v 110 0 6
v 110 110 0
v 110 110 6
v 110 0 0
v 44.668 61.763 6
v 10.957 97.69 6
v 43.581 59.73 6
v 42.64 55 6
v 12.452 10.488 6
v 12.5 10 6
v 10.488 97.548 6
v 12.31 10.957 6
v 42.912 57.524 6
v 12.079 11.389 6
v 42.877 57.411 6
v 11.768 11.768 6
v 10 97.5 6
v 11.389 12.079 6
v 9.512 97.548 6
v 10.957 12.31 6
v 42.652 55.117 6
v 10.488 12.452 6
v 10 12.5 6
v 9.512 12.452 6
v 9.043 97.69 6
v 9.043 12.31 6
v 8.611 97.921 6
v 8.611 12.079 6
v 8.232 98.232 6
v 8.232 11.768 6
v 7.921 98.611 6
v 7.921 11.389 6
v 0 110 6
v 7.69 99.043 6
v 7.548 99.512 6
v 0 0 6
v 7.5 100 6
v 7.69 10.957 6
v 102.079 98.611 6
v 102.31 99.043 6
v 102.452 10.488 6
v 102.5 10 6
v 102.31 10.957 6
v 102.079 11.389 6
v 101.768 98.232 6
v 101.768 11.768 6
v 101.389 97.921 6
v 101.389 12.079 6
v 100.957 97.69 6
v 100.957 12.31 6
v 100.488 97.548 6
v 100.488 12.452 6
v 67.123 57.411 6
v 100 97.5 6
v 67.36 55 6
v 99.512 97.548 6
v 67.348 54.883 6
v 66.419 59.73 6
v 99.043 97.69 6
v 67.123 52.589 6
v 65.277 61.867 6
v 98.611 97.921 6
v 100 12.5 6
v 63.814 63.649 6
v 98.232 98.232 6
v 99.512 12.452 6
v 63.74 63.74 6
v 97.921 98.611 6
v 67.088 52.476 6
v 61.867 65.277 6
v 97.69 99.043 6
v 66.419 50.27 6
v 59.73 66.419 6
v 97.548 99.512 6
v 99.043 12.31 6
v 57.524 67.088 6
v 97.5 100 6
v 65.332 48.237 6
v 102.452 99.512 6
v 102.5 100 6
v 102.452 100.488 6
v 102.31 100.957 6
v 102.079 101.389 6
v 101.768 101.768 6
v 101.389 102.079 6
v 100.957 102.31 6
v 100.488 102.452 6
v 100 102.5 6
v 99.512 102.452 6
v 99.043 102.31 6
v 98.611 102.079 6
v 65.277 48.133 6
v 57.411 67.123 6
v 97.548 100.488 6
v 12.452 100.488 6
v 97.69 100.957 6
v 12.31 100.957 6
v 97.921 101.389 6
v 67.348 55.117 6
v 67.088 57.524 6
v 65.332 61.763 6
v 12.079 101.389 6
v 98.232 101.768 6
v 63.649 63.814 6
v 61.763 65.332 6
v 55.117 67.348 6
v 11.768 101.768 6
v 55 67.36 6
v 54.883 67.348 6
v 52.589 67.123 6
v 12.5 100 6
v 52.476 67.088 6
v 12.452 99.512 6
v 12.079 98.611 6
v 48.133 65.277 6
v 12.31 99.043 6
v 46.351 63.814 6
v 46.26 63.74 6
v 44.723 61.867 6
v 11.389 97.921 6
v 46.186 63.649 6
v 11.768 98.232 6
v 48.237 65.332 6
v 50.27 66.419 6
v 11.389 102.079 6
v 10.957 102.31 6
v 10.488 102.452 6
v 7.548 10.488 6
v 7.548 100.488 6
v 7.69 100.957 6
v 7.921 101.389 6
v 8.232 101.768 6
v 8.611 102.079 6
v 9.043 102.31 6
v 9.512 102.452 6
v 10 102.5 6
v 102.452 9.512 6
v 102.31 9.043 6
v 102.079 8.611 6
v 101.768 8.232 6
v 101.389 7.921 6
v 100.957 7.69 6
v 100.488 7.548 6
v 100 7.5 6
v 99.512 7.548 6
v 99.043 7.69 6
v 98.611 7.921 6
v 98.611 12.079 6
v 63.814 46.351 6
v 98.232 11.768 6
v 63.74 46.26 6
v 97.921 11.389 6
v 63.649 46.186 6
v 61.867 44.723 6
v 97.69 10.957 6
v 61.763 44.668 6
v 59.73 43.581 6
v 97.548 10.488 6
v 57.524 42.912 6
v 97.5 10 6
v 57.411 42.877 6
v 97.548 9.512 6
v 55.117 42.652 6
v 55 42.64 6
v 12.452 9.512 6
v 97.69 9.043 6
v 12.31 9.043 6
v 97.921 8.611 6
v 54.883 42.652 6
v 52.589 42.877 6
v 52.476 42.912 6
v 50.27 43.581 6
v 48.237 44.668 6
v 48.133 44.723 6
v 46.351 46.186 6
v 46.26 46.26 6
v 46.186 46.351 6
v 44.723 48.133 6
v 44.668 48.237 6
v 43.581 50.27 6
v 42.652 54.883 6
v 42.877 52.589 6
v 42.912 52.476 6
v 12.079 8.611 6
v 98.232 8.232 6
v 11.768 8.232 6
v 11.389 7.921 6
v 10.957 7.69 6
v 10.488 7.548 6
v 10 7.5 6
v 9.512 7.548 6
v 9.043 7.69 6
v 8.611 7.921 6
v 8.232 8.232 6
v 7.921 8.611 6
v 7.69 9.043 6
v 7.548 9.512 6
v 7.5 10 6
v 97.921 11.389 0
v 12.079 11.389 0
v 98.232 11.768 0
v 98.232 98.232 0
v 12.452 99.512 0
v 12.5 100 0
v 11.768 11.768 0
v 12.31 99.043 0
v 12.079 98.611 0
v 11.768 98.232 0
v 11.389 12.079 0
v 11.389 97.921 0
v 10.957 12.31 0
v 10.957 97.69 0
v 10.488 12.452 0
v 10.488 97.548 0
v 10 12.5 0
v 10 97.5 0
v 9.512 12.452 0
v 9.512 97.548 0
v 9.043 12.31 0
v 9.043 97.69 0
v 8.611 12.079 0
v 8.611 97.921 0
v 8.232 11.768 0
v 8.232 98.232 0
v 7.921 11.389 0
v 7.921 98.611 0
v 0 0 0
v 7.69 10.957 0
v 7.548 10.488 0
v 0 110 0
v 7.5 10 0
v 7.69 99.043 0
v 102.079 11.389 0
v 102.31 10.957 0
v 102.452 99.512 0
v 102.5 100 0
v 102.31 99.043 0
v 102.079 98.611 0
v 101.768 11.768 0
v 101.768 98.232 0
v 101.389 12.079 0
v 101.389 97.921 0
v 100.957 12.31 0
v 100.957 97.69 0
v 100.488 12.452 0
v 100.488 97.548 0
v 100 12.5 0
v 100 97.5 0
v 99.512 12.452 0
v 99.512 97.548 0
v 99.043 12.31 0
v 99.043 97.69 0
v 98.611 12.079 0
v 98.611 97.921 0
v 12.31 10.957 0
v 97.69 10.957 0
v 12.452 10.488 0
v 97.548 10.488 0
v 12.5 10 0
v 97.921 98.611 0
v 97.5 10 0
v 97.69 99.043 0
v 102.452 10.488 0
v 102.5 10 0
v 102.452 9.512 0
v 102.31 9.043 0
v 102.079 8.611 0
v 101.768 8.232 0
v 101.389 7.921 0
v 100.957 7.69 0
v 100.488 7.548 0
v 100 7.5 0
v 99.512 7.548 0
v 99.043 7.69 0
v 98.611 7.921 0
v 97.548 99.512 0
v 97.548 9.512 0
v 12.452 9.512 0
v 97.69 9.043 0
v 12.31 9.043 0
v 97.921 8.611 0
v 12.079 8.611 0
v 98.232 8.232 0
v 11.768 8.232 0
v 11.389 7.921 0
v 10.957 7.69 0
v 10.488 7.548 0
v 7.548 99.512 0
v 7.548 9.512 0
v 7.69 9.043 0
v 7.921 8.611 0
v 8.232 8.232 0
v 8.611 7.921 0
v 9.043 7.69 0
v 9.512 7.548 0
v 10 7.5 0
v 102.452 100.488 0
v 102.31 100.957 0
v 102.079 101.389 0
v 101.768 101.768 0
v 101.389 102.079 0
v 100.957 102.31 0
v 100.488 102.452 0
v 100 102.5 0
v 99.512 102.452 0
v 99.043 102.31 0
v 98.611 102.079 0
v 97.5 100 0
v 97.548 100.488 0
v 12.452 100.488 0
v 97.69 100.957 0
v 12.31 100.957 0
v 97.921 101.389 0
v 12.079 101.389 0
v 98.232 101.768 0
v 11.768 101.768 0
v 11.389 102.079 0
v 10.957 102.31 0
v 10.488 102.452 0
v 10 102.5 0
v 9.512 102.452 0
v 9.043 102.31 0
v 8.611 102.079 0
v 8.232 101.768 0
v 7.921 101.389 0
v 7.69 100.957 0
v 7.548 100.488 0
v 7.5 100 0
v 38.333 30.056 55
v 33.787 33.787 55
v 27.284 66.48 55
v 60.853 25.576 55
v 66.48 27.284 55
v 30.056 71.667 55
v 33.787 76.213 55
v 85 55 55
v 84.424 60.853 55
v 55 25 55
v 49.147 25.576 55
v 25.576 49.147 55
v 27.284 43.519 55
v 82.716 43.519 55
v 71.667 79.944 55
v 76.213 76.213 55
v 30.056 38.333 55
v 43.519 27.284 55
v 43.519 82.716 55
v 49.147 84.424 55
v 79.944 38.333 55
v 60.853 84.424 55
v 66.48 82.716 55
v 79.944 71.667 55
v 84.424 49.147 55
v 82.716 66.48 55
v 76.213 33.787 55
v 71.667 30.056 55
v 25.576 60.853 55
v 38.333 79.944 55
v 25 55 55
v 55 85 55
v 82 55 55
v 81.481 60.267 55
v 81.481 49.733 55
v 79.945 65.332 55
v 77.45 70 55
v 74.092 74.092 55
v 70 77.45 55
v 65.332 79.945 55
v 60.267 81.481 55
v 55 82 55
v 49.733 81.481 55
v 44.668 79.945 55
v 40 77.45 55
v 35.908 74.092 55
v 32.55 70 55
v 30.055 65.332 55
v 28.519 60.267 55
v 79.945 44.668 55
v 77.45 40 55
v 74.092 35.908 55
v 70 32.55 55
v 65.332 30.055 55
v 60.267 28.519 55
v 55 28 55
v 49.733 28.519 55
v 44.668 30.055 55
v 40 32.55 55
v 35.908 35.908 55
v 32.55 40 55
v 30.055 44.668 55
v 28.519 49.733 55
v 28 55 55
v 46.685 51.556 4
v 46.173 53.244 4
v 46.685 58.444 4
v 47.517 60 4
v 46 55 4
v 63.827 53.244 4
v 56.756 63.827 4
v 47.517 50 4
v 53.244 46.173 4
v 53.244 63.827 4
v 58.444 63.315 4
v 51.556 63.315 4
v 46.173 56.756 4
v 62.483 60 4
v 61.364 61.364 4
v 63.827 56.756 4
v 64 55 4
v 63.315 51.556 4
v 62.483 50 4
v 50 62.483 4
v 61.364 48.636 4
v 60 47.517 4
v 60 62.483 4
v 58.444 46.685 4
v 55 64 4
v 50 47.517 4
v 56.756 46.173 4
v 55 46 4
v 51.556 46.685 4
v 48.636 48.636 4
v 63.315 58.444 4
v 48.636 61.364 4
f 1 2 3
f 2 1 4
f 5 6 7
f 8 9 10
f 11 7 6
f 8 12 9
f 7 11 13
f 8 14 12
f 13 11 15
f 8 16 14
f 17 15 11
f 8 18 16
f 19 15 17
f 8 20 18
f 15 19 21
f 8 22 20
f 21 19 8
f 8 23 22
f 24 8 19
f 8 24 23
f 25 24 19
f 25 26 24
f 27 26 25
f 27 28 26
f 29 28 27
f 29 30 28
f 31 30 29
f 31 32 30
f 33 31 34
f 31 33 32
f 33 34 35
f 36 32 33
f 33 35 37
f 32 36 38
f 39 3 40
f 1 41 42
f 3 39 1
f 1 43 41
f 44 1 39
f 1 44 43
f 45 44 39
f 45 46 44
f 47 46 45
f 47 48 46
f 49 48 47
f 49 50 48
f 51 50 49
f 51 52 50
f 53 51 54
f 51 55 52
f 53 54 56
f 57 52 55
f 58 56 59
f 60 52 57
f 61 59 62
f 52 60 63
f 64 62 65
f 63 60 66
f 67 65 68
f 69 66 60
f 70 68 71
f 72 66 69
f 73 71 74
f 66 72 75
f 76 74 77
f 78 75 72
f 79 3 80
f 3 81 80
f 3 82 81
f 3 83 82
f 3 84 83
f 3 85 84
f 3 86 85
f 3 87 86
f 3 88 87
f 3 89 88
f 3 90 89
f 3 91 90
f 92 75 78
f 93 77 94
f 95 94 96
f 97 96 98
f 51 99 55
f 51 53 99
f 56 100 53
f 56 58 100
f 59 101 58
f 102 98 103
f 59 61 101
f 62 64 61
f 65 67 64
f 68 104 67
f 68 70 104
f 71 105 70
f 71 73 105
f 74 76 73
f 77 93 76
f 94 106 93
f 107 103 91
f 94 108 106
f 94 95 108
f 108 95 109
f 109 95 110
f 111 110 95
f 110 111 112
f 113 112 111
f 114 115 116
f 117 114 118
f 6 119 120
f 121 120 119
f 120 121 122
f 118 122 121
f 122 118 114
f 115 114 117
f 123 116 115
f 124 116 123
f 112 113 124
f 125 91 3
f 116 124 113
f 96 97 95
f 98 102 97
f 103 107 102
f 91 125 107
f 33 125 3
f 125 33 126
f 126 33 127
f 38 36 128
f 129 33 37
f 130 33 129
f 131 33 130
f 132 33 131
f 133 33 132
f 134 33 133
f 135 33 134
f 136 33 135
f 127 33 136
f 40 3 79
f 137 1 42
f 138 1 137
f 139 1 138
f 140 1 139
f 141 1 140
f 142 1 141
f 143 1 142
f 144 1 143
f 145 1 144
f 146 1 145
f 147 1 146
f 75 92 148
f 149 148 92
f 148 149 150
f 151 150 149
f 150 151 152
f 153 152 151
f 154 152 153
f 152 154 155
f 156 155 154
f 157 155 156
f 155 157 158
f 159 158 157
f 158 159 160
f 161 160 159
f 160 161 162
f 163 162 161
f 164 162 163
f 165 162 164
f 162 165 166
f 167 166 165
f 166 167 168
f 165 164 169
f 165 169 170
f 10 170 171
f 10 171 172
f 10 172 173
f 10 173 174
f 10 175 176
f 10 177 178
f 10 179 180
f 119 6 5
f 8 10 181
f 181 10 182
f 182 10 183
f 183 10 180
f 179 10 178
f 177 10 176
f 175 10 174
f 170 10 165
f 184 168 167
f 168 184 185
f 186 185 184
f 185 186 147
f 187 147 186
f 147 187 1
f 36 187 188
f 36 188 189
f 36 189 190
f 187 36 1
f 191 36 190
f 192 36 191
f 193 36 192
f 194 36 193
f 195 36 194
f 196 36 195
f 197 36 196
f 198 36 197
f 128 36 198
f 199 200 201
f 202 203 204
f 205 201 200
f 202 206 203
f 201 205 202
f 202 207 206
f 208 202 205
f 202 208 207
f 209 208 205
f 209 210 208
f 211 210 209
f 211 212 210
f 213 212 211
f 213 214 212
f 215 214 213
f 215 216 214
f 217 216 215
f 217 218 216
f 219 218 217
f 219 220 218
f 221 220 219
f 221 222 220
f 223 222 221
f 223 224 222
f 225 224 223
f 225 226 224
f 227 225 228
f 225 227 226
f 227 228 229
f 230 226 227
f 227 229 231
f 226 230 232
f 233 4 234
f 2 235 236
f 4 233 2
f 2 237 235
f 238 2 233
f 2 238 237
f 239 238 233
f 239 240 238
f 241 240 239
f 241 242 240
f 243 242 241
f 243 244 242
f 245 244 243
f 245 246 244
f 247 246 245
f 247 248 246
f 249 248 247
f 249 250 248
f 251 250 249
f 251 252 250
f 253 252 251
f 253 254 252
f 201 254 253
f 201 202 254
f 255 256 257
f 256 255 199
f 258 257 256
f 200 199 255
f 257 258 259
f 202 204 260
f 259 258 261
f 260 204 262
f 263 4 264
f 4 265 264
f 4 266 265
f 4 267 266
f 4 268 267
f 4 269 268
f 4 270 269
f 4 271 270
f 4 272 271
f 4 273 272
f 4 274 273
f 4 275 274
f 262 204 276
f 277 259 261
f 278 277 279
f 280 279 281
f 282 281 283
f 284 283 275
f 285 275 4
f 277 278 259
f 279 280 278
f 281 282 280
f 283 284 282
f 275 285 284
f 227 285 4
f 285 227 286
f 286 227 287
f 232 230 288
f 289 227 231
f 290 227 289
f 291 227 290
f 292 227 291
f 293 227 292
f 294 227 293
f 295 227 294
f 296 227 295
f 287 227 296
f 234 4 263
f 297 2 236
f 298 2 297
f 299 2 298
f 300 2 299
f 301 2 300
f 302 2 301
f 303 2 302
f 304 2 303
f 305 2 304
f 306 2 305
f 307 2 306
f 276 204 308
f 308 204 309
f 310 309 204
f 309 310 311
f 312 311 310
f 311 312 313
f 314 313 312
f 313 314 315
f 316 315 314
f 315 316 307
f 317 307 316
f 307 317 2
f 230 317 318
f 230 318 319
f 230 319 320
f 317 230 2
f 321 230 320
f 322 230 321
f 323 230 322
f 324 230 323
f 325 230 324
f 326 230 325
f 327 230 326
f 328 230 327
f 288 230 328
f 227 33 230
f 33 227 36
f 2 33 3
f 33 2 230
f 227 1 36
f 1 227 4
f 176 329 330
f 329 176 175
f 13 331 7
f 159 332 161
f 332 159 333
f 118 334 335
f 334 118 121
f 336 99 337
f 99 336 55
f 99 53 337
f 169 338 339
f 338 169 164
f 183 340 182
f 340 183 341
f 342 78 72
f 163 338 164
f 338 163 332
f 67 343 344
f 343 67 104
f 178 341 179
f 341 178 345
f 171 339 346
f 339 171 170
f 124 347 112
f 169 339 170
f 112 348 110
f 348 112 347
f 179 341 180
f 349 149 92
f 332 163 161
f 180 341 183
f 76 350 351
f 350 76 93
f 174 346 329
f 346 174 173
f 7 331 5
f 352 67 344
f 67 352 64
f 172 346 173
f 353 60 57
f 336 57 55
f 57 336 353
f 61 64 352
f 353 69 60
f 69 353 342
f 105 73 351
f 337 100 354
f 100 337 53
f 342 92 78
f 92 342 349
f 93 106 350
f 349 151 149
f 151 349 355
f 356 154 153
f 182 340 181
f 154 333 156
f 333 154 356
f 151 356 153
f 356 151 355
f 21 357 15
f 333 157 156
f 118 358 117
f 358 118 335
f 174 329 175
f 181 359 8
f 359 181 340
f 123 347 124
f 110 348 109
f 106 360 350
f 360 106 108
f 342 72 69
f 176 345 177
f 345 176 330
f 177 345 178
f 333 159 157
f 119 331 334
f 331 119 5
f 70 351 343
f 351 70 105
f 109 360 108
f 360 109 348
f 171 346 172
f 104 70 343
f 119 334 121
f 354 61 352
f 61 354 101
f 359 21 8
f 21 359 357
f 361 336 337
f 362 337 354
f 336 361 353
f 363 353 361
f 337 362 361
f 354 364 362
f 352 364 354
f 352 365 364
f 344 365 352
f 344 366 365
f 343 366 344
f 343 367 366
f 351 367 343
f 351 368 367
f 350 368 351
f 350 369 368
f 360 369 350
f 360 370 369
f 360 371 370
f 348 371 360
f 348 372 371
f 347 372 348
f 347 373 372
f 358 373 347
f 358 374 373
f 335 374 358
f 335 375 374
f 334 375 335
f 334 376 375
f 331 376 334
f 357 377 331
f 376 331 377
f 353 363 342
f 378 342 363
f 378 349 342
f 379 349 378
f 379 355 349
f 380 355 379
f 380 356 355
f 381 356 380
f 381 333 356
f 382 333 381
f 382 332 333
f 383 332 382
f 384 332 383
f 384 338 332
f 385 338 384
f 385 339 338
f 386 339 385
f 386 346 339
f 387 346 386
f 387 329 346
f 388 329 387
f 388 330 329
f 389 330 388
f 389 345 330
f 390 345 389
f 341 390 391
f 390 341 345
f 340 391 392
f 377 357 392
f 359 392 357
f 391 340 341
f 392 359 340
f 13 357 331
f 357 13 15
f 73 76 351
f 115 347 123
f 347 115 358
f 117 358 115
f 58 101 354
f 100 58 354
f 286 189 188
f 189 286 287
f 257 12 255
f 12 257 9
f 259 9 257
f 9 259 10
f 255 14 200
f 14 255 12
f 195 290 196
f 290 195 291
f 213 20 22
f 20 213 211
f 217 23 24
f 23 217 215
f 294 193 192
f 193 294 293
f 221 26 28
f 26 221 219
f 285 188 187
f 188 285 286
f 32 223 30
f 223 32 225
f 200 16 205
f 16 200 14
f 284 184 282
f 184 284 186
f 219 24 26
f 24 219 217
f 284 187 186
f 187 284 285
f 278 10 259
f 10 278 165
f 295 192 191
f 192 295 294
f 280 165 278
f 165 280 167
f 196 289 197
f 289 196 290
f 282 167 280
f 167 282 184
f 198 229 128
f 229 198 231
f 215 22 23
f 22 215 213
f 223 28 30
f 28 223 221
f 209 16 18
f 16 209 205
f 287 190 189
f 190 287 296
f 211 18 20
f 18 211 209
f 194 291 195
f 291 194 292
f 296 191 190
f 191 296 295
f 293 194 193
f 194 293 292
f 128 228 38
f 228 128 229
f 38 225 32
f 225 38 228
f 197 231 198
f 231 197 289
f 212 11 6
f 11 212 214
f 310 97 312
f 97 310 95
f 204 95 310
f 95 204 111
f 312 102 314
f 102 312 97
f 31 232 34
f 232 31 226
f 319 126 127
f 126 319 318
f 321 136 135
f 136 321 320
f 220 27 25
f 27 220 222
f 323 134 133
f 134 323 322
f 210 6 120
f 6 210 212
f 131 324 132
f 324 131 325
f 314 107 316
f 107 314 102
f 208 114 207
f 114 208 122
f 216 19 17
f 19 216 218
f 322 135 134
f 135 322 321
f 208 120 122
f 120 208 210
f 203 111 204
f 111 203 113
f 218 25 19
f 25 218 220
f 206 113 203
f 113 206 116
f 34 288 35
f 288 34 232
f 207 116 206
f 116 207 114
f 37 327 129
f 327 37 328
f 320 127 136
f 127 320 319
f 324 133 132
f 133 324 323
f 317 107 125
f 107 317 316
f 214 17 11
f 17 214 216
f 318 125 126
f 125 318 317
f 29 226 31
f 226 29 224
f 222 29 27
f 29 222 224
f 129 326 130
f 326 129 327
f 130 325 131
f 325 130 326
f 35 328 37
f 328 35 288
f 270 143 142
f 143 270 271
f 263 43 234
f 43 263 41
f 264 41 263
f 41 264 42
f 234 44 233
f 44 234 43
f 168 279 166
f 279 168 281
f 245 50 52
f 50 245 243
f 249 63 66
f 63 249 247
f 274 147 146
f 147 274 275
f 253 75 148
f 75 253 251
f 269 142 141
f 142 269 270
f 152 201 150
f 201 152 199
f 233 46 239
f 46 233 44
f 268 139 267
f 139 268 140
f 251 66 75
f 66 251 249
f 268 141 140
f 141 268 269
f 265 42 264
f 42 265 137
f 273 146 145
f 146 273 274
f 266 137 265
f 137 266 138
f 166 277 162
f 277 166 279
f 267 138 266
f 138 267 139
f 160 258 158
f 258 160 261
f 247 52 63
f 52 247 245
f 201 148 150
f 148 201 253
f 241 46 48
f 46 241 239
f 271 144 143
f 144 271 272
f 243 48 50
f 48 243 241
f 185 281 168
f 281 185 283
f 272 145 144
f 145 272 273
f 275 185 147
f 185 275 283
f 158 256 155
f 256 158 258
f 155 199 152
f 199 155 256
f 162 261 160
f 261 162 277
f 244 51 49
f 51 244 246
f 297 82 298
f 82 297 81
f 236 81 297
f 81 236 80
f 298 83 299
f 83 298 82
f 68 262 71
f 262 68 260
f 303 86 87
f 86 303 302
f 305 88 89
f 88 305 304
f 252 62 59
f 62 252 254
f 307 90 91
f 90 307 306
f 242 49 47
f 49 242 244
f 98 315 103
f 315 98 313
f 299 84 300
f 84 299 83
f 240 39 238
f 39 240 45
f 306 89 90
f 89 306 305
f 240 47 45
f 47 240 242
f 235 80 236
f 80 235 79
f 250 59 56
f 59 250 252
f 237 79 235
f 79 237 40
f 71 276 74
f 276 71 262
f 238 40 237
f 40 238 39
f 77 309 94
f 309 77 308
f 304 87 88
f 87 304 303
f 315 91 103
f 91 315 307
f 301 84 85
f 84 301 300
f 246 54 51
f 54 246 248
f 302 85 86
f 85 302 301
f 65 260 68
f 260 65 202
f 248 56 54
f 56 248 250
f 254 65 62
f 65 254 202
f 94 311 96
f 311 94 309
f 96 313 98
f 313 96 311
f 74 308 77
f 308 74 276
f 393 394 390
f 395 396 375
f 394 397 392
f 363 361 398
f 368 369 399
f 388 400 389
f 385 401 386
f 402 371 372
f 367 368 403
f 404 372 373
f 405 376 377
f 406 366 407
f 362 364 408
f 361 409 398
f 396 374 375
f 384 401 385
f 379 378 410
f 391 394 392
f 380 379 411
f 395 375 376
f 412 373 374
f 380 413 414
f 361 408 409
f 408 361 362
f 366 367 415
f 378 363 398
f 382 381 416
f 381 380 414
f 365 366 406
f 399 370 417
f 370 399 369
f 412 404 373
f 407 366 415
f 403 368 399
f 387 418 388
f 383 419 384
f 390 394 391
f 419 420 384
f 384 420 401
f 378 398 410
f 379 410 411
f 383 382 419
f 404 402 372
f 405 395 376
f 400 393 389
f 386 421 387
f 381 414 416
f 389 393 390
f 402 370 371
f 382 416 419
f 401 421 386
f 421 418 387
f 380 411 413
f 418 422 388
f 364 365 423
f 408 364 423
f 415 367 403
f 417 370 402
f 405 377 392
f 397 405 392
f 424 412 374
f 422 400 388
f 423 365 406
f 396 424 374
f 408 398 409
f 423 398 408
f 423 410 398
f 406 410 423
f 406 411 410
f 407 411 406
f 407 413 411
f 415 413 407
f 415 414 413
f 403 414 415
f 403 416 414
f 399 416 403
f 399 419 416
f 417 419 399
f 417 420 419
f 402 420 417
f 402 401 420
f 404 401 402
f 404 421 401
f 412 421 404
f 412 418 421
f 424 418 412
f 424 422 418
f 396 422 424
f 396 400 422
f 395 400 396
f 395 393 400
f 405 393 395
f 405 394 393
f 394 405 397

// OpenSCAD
$fn = 32;

// ----------------------------------------------------------------------
// Hopper: flanged with square flange
// ----------------------------------------------------------------------

// --- parameters (mm) ---
fl = 110;                 // flange side, X and Y
fl_t = 6;                 // flange thickness
cone_h = 50;              // cone height above the flange
top_d = 60;               // cone mouth diameter
bot_d = 24;               // cone spout diameter
wall = 3;                 // cone wall thickness
hole_r = 2.5;             // flange hole radius
hole_in = 10;             // hole inset from the corners

bore_d = bot_d - 2 * wall;  // spout bore diameter
total_h = fl_t + cone_h - 1;  // overall height

difference() {
  union() {
    cube([fl, fl, fl_t]);
    translate([fl / 2, fl / 2, fl_t - 1])
      cylinder(h = cone_h, d1 = bot_d, d2 = top_d);
  }
  translate([fl / 2, fl / 2, fl_t - 2])
    cylinder(h = cone_h + 1, d1 = bore_d, d2 = top_d - 2 * wall);
  for (sx = [0, 1], sy = [0, 1])
    translate([sx ? fl - hole_in : hole_in,
               sy ? fl - hole_in : hole_in, -1])
      cylinder(r = hole_r, h = fl_t + 2);
}
